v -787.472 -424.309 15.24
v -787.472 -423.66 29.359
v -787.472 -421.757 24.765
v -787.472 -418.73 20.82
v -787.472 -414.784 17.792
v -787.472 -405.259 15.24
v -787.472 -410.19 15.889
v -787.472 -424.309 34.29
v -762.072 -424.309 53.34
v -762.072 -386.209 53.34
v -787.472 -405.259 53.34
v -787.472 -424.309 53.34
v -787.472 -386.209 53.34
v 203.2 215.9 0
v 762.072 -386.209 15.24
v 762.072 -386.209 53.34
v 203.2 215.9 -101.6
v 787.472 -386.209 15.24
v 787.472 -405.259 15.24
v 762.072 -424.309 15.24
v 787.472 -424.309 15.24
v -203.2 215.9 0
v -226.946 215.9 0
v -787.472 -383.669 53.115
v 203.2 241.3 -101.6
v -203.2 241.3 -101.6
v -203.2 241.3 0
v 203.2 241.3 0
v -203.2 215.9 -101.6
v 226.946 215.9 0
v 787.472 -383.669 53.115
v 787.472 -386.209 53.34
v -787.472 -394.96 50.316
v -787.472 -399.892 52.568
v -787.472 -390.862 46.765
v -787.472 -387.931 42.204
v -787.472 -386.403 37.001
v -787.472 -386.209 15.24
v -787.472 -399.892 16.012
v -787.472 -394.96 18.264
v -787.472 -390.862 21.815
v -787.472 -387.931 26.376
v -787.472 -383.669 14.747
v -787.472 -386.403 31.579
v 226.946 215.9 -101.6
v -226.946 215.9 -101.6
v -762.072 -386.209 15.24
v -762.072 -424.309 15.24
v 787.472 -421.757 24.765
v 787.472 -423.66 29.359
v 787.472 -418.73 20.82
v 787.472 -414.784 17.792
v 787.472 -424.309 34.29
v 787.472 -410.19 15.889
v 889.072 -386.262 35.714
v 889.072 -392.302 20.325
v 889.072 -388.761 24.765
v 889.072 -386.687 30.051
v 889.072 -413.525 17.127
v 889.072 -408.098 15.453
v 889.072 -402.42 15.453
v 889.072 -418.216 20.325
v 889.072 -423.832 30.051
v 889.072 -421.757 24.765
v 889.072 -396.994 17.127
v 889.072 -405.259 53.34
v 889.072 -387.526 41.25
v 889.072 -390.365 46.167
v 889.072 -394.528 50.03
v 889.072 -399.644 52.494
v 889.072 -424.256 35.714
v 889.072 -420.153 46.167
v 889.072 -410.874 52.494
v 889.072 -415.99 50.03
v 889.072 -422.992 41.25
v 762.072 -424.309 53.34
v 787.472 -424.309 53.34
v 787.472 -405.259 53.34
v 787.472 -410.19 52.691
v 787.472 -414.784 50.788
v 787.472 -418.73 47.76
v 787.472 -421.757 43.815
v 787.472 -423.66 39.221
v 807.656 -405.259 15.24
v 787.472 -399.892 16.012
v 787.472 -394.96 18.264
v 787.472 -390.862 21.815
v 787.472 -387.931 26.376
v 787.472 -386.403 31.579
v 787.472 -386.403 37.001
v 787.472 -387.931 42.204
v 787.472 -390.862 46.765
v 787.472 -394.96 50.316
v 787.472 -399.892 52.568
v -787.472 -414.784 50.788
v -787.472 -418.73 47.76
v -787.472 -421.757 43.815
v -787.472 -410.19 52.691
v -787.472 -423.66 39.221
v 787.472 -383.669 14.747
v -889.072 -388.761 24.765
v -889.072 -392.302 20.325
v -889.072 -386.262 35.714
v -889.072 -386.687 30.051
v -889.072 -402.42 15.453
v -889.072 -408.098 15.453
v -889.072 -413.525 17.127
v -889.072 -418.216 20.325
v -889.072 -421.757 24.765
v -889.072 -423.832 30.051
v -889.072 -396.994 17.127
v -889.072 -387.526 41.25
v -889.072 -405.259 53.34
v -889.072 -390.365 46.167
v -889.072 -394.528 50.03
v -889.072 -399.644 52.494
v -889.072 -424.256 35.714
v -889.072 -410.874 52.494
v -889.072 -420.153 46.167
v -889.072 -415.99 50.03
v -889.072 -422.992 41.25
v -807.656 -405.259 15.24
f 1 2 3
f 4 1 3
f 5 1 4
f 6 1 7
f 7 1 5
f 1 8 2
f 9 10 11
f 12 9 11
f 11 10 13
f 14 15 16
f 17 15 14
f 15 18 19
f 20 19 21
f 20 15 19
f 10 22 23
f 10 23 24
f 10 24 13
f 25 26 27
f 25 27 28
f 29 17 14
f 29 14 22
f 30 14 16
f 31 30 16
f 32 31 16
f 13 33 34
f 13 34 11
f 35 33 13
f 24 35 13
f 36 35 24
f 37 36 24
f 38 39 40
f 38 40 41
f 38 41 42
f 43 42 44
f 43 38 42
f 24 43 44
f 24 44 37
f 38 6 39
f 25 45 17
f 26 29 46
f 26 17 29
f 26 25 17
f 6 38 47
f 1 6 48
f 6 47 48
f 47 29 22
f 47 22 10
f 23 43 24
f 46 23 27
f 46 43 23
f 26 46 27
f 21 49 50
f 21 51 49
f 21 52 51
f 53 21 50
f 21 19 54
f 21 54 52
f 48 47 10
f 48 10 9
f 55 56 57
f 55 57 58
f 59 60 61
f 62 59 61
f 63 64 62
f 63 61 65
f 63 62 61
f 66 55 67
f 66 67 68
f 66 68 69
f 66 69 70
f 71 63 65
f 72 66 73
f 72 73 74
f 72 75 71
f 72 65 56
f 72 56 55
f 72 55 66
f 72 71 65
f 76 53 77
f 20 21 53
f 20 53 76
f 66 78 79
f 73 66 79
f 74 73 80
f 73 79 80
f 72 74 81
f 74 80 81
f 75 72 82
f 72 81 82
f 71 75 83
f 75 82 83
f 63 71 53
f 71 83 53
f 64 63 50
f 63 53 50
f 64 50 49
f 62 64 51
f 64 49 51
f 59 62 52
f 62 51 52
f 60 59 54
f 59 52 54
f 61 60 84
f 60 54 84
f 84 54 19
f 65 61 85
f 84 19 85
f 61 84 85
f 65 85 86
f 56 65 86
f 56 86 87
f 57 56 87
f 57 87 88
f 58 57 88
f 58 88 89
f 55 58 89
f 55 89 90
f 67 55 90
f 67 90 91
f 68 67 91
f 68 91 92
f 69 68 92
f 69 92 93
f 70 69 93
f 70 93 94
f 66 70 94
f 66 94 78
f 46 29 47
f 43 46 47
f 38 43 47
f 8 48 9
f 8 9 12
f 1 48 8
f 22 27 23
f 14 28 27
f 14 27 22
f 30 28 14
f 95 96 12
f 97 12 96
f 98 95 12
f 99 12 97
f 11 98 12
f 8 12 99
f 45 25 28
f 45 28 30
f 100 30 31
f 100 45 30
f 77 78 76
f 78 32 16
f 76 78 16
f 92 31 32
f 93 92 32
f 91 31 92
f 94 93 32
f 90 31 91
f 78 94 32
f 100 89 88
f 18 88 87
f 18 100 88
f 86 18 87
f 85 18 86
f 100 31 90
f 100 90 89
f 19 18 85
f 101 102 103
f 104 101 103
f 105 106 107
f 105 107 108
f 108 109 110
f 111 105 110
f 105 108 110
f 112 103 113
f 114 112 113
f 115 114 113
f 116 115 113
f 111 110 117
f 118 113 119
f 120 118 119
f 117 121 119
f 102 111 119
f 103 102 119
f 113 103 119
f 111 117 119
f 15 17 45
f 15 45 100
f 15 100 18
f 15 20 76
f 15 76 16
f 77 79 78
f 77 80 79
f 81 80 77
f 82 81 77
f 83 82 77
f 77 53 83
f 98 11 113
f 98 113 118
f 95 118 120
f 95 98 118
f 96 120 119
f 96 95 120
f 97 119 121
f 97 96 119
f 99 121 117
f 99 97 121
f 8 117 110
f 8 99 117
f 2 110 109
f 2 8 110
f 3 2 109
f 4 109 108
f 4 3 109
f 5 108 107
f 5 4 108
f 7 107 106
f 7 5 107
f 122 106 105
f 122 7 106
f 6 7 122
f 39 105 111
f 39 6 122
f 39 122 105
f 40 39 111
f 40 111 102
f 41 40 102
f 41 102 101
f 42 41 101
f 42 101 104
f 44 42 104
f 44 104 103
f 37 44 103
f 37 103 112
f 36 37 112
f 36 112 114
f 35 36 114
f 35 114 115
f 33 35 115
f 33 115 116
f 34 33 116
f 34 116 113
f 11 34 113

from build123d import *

# Parameters (mm, degrees)
BOSS_EXTRUDE6_DEPTH            = 53.34
BOSS_EXTRUDE6_DEPTH_BACK       = 101.6
SKETCH13_R                     = 19.05
BOSS_EXTRUDE7_DEPTH            = 101.6
CUT_EXTRUDE8_REACH             = 992.358
CUT_EXTRUDE8_DIRECTION_2_REACH = 992.358


with BuildPart() as part:
    # Sketch12 → Boss-Extrude6 (new, two sides: drawn at the far end of the back side and taken through both)
    with BuildSketch(Plane.XY.offset(-BOSS_EXTRUDE6_DEPTH_BACK)):
        Polygon((-203.2, 241.3), (203.2, 241.3), (787.471663752, -383.669201703), (787.471663752, -424.309201703), (762.071663752, -424.309201703), (762.071663752, -386.209201703), (203.2, 215.9), (-203.2, 215.9), (-762.071663752, -386.209201703), (-762.071663752, -424.309201703), (-787.471663752, -424.309201703), (-787.471663752, -383.669201703), align=None)
    extrude(amount=BOSS_EXTRUDE6_DEPTH + BOSS_EXTRUDE6_DEPTH_BACK)

    # Sketch13 → Boss-Extrude7 (add)
    with BuildSketch(Plane(origin=(787.471663752, 0, 0), x_dir=(0, 0, -1), z_dir=(1, 0, 0))):
        with Locations(Location((-34.29, -405.259201703, 0), (0, 0, 180))):
            Circle(SKETCH13_R)
    boss_extrude7 = extrude(amount=BOSS_EXTRUDE7_DEPTH)

    # Mirror1: Boss-Extrude7 across plane
    add(boss_extrude7.mirror(Plane(origin=(0, 0, 0), x_dir=(0, 0, 1), z_dir=(1, 0, 0))))

    # Cut-Extrude8: up to this plane
    cut_extrude8_end = Plane(origin=(-203.2, 241.3, -101.6), z_dir=(-0.7304911811601322, 0.6829221289775833, 0))
    # Sketch14 → Cut-Extrude8 (cut, up to the surface)
    with BuildSketch(Plane(origin=(0, 0, 0), x_dir=(0, 0, -1), z_dir=(1, 0, 0)), mode=Mode.PRIVATE) as cut_extrude8_sk1:
        Polygon((0, 241.3), (0, 215.9), (-53.34, -386.209201703), (-53.34, 241.3), align=None)
    cut_extrude8_tool1 = split(extrude(cut_extrude8_sk1.sketch, amount=-CUT_EXTRUDE8_REACH, mode=Mode.PRIVATE), bisect_by=cut_extrude8_end, keep=Keep.BOTH, mode=Mode.PRIVATE)
    add(cut_extrude8_tool1.solids().sort_by_distance((0, 31.800889, 34.868308))[0], mode=Mode.SUBTRACT)
    # Sketch14 → Cut-Extrude8 (cut, up to the surface)
    with BuildSketch(Plane(origin=(0, 0, 0), x_dir=(0, 0, -1), z_dir=(1, 0, 0)), mode=Mode.PRIVATE) as cut_extrude8_sk2:
        Polygon((101.6, 215.9), (-15.24, -386.209201703), (-15.24, -424.309201703), (101.6, -424.309201703), align=None)
    cut_extrude8_tool2 = split(extrude(cut_extrude8_sk2.sketch, amount=-CUT_EXTRUDE8_REACH, mode=Mode.PRIVATE), bisect_by=cut_extrude8_end, keep=Keep.BOTH, mode=Mode.PRIVATE)
    add(cut_extrude8_tool2.solids().sort_by_distance((0, -210.192787, -60.465735))[0], mode=Mode.SUBTRACT)

    # Cut-Extrude8 direction 2: up to this plane
    cut_extrude8_direction_2_end = Plane(origin=(203.2, 241.3, -101.6), z_dir=(0.7304911811601321, 0.6829221289775835, 0))
    # Sketch14 → Cut-Extrude8 direction 2 (cut, up to the surface)
    with BuildSketch(Plane(origin=(0, 0, 0), x_dir=(0, 0, -1), z_dir=(1, 0, 0)), mode=Mode.PRIVATE) as cut_extrude8_direction_2_sk1:
        Polygon((0, 241.3), (0, 215.9), (-53.34, -386.209201703), (-53.34, 241.3), align=None)
    cut_extrude8_direction_2_tool1 = split(extrude(cut_extrude8_direction_2_sk1.sketch, amount=CUT_EXTRUDE8_DIRECTION_2_REACH, mode=Mode.PRIVATE), bisect_by=cut_extrude8_direction_2_end, keep=Keep.BOTH, mode=Mode.PRIVATE)
    add(cut_extrude8_direction_2_tool1.solids().sort_by_distance((0, 31.800889, 34.868308))[0], mode=Mode.SUBTRACT)
    # Sketch14 → Cut-Extrude8 direction 2 (cut, up to the surface)
    with BuildSketch(Plane(origin=(0, 0, 0), x_dir=(0, 0, -1), z_dir=(1, 0, 0)), mode=Mode.PRIVATE) as cut_extrude8_direction_2_sk2:
        Polygon((101.6, 215.9), (-15.24, -386.209201703), (-15.24, -424.309201703), (101.6, -424.309201703), align=None)
    cut_extrude8_direction_2_tool2 = split(extrude(cut_extrude8_direction_2_sk2.sketch, amount=CUT_EXTRUDE8_DIRECTION_2_REACH, mode=Mode.PRIVATE), bisect_by=cut_extrude8_direction_2_end, keep=Keep.BOTH, mode=Mode.PRIVATE)
    add(cut_extrude8_direction_2_tool2.solids().sort_by_distance((0, -210.192787, -60.465735))[0], mode=Mode.SUBTRACT)


solid = part.part
